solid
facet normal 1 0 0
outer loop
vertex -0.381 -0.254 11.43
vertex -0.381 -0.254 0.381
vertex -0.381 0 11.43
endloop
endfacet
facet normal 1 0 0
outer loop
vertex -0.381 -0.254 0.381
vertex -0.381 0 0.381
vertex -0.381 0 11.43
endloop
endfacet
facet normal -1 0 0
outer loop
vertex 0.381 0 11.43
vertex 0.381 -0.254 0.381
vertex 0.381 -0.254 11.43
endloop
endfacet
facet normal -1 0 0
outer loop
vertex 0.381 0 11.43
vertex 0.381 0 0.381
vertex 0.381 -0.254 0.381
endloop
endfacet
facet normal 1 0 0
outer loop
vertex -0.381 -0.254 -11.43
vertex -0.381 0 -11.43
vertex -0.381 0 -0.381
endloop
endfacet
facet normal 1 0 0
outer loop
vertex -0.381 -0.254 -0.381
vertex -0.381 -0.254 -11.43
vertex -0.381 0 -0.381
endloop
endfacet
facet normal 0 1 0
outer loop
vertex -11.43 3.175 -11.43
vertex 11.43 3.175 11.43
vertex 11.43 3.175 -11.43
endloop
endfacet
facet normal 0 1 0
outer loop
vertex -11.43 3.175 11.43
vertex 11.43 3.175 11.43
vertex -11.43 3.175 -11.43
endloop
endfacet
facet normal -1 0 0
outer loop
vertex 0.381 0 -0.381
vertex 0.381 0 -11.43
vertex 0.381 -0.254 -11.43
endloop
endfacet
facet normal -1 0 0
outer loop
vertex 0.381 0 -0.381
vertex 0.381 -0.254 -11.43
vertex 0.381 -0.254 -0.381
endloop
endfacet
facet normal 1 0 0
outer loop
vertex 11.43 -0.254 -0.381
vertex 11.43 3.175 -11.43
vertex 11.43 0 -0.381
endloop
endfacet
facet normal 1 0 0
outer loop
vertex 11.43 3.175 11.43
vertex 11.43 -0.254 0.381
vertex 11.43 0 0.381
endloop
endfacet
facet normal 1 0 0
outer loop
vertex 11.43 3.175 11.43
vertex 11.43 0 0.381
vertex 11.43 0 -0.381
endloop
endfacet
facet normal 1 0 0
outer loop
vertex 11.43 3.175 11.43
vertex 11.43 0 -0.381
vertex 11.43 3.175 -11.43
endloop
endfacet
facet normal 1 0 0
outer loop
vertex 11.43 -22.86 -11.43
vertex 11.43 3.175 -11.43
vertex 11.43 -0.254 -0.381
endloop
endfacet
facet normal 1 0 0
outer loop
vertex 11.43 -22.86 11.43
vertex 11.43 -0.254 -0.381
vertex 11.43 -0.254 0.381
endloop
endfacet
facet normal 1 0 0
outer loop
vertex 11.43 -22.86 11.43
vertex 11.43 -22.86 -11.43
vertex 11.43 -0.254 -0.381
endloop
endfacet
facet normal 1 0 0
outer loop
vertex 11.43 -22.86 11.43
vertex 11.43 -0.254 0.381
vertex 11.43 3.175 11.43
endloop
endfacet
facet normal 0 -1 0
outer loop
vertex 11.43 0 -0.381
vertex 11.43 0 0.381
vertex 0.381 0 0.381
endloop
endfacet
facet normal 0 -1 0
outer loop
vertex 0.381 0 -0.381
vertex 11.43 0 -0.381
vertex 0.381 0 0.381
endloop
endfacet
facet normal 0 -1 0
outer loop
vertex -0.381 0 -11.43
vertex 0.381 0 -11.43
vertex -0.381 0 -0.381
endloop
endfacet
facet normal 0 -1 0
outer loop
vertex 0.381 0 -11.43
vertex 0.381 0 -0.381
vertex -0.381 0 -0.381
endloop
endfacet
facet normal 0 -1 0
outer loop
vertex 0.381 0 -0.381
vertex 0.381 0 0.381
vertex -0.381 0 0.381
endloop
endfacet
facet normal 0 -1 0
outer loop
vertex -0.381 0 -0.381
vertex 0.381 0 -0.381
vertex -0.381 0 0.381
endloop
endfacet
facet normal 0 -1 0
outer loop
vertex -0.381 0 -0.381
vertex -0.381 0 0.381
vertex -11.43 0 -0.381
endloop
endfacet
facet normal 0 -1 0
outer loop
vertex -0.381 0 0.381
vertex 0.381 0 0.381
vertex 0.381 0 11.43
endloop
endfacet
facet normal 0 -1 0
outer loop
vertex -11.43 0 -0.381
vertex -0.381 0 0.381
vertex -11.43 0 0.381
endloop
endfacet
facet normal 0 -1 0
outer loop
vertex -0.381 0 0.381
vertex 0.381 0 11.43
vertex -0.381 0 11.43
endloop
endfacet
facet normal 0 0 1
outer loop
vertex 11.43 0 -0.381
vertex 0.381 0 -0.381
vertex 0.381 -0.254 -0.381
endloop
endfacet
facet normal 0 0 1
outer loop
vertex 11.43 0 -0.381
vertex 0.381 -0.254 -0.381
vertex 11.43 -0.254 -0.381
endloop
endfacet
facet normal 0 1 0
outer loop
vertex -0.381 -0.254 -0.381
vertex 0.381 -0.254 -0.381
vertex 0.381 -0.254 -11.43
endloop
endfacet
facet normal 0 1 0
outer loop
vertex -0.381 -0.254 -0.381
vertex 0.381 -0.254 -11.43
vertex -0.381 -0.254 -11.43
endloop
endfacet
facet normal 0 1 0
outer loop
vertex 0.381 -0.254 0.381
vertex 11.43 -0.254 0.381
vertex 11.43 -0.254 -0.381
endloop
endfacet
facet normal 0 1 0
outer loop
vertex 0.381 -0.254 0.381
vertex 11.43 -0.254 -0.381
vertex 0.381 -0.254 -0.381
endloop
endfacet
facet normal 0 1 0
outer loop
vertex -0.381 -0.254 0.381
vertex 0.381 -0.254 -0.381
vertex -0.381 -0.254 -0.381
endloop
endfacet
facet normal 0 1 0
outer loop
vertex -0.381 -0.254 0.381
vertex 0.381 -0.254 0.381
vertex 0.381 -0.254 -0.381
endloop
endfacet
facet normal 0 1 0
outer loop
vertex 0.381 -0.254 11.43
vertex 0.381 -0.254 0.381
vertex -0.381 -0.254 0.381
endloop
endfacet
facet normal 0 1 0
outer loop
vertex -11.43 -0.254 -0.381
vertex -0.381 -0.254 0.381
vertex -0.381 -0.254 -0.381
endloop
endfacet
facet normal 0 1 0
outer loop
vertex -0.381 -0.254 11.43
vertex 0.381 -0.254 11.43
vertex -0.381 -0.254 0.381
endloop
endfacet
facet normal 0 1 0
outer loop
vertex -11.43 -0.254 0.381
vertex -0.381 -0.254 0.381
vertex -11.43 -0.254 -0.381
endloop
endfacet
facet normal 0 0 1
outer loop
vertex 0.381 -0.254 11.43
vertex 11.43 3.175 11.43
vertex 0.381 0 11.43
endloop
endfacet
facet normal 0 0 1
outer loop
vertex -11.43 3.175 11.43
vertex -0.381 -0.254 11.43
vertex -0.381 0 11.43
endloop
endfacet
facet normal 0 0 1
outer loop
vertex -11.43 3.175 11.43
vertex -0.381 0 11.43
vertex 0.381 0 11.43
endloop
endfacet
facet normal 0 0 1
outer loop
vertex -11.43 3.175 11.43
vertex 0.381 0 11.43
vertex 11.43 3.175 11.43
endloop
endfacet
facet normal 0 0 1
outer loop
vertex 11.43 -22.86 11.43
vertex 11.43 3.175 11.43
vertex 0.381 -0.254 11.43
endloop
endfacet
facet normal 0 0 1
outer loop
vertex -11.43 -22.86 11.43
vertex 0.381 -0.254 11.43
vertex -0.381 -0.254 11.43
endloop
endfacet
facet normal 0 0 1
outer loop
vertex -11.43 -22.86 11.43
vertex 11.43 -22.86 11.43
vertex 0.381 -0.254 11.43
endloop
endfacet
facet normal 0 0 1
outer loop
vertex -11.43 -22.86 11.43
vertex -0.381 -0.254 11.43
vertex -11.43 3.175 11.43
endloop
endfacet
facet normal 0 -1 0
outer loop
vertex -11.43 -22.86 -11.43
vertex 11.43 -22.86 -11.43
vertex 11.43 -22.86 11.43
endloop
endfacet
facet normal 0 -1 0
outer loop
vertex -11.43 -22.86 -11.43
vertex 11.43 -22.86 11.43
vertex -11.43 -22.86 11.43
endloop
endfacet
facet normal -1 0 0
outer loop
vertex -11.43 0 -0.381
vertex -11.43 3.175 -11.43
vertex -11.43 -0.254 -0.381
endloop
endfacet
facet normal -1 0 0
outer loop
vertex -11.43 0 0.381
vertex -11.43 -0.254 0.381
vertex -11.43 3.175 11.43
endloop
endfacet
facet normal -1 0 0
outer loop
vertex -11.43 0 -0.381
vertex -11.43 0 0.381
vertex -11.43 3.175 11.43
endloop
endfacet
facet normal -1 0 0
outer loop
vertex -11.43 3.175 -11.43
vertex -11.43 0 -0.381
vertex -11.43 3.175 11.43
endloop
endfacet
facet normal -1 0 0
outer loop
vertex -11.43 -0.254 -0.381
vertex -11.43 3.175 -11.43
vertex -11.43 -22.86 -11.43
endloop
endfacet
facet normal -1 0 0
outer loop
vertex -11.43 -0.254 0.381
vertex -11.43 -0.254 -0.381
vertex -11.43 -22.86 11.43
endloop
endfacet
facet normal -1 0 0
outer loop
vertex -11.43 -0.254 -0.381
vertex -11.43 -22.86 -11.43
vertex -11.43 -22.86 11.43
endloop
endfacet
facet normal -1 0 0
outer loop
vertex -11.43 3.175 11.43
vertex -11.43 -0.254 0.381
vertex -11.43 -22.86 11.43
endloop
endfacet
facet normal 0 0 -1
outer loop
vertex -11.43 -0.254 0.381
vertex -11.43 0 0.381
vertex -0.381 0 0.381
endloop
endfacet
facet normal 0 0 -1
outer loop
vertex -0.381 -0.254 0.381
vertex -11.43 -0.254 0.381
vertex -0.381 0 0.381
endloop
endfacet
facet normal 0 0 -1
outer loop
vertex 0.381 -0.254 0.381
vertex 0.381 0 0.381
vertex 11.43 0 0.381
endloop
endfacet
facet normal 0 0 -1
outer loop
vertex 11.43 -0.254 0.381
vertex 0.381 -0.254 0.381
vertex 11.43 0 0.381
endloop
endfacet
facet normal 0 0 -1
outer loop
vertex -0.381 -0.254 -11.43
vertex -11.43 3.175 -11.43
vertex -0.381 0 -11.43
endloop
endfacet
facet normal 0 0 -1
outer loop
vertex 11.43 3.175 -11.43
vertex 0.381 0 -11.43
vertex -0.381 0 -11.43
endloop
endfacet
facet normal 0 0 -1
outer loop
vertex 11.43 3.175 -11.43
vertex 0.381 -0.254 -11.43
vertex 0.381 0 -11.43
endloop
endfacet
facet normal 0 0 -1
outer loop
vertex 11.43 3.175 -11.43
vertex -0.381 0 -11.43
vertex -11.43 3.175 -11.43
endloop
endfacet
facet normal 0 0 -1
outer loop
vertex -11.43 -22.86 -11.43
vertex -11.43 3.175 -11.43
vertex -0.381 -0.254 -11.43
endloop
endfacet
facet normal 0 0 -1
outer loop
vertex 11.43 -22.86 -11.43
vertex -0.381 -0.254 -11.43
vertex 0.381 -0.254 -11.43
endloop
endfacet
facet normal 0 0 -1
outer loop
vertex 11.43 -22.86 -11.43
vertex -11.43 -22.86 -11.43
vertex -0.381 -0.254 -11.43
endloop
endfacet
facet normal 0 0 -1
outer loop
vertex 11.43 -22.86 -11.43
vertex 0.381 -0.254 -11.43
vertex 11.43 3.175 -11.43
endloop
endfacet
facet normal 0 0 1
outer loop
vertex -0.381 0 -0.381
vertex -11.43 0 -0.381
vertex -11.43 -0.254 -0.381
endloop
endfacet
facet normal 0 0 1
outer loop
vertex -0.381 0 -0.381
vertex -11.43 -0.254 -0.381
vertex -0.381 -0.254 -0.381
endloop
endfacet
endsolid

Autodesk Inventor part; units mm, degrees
ref_plane "YZ Plane" through (0, 0, 0) normal (1, 0, 0) x (0, 1, 0)
ref_plane "XY Plane" through (0, 0, 0) normal (0, 0, 1) x (1, 0, 0)
sketch "Sketch1" plane through (0, 0, 0) normal (0, 1, 0) x (-1, 0, 0)
  line L0 (11.43, 11.43) -> (-11.43, 11.43)
  line L1 (-11.43, 11.43) -> (-11.43, -11.43)
  line L2 (-11.43, -11.43) -> (11.43, -11.43)
  line L3 (11.43, -11.43) -> (11.43, 11.43)
  line L4 (0.381, -11.43) -> (0.381, 11.43)
  line L5 (-0.381, -11.43) -> (-0.381, 11.43)
  line L6 (11.43, -0.381) -> (-11.43, -0.381)
  line L7 (11.43, 0.381) -> (-11.43, 0.381)
  circle A0 centre (0, 0) radius 5.08
  line L8 (12.446, -12.446) -> (-12.446, -12.446)
  line L9 (-12.446, -12.446) -> (-12.446, 12.446)
  line L10 (-12.446, 12.446) -> (12.446, 12.446)
  line L11 (12.446, 12.446) -> (12.446, -12.446)
  dimension "d0" = 22.86
  dimension "d1" = 22.86
  dimension "d2" = 11.43
  dimension "d3" = 11.43
  dimension "d7" = 0.381
  dimension "d8" = 0.762
  dimension "d12" = 0.381
  dimension "d13" = 0.381
  dimension "d14" = 0.762
  dimension "d21" = 10.16
  dimension "d28" = 1.016
  dimension "d29" = 1.016
  dimension "d30" = 1.016
  dimension "d31" = 1.016
extrude "Extrusion2" add sketch "Sketch1" against normal blind 22.86 contours L3 L7 A0 L4 L0 | L4 A0 L5 L0 | L3 L6 A0 L7 | L5 A0 L7 L1 L0 | A0 L7 L4 | L4 L7 L5 A0 | L3 L2 L4 A0 L6 | A0 L6 L4 L7 | L5 L7 A0 | L4 L6 L5 L7 | A0 L4 L6 | L7 A0 L6 L1 | L5 L6 A0 L7 | L4 A0 L5 L6 | L2 L5 A0 L4 | L6 A0 L5 L2 L1 | L5 A0 L6
extrude "Extrusion3" cut sketch "Sketch1" against normal blind 0.254 contours L4 A0 L5 L0 | L3 L6 A0 L7 | L4 L7 L5 A0 | A0 L6 L4 L7 | L4 L6 L5 L7 | L7 A0 L6 L1 | L5 L6 A0 L7 | L4 A0 L5 L6 | L2 L5 A0 L4
extrude "Extrusion4" add sketch "Sketch1" along normal blind 0.508 contours A0 L7 L4 | L4 L7 L5 A0 | A0 L6 L4 L7 | L5 L7 A0 | L4 L6 L5 L7 | A0 L4 L6 | L5 L6 A0 L7 | L4 A0 L5 L6 | L5 A0 L6
sketch "Sketch3" plane through (0, 0, 0) normal (0, 1, 0) x (-1, 0, 0)
  line L0 (11.43, -11.43) -> (11.43, -0.381) projected
  line L1 (-11.43, 11.43) -> (-11.43, 0.381) projected
  line L2 (11.43, -11.43) -> (-11.43, -11.43)
  line L3 (-11.43, -11.43) -> (-11.43, 11.43)
  line L4 (-11.43, 11.43) -> (11.43, 11.43)
  line L5 (11.43, 11.43) -> (11.43, -11.43)
  point P0 (0, 0)
extrude "Extrusion5" add sketch "Sketch3" along normal blind 3.175
sketch "Sketch4" plane through (0, 0, 0) normal (0, 1, 0) x (-1, 0, 0)
  circle A0 centre (0, -0.381) radius 8.0989
  point P0 (0, 0)
properties part number "companion_cube"
